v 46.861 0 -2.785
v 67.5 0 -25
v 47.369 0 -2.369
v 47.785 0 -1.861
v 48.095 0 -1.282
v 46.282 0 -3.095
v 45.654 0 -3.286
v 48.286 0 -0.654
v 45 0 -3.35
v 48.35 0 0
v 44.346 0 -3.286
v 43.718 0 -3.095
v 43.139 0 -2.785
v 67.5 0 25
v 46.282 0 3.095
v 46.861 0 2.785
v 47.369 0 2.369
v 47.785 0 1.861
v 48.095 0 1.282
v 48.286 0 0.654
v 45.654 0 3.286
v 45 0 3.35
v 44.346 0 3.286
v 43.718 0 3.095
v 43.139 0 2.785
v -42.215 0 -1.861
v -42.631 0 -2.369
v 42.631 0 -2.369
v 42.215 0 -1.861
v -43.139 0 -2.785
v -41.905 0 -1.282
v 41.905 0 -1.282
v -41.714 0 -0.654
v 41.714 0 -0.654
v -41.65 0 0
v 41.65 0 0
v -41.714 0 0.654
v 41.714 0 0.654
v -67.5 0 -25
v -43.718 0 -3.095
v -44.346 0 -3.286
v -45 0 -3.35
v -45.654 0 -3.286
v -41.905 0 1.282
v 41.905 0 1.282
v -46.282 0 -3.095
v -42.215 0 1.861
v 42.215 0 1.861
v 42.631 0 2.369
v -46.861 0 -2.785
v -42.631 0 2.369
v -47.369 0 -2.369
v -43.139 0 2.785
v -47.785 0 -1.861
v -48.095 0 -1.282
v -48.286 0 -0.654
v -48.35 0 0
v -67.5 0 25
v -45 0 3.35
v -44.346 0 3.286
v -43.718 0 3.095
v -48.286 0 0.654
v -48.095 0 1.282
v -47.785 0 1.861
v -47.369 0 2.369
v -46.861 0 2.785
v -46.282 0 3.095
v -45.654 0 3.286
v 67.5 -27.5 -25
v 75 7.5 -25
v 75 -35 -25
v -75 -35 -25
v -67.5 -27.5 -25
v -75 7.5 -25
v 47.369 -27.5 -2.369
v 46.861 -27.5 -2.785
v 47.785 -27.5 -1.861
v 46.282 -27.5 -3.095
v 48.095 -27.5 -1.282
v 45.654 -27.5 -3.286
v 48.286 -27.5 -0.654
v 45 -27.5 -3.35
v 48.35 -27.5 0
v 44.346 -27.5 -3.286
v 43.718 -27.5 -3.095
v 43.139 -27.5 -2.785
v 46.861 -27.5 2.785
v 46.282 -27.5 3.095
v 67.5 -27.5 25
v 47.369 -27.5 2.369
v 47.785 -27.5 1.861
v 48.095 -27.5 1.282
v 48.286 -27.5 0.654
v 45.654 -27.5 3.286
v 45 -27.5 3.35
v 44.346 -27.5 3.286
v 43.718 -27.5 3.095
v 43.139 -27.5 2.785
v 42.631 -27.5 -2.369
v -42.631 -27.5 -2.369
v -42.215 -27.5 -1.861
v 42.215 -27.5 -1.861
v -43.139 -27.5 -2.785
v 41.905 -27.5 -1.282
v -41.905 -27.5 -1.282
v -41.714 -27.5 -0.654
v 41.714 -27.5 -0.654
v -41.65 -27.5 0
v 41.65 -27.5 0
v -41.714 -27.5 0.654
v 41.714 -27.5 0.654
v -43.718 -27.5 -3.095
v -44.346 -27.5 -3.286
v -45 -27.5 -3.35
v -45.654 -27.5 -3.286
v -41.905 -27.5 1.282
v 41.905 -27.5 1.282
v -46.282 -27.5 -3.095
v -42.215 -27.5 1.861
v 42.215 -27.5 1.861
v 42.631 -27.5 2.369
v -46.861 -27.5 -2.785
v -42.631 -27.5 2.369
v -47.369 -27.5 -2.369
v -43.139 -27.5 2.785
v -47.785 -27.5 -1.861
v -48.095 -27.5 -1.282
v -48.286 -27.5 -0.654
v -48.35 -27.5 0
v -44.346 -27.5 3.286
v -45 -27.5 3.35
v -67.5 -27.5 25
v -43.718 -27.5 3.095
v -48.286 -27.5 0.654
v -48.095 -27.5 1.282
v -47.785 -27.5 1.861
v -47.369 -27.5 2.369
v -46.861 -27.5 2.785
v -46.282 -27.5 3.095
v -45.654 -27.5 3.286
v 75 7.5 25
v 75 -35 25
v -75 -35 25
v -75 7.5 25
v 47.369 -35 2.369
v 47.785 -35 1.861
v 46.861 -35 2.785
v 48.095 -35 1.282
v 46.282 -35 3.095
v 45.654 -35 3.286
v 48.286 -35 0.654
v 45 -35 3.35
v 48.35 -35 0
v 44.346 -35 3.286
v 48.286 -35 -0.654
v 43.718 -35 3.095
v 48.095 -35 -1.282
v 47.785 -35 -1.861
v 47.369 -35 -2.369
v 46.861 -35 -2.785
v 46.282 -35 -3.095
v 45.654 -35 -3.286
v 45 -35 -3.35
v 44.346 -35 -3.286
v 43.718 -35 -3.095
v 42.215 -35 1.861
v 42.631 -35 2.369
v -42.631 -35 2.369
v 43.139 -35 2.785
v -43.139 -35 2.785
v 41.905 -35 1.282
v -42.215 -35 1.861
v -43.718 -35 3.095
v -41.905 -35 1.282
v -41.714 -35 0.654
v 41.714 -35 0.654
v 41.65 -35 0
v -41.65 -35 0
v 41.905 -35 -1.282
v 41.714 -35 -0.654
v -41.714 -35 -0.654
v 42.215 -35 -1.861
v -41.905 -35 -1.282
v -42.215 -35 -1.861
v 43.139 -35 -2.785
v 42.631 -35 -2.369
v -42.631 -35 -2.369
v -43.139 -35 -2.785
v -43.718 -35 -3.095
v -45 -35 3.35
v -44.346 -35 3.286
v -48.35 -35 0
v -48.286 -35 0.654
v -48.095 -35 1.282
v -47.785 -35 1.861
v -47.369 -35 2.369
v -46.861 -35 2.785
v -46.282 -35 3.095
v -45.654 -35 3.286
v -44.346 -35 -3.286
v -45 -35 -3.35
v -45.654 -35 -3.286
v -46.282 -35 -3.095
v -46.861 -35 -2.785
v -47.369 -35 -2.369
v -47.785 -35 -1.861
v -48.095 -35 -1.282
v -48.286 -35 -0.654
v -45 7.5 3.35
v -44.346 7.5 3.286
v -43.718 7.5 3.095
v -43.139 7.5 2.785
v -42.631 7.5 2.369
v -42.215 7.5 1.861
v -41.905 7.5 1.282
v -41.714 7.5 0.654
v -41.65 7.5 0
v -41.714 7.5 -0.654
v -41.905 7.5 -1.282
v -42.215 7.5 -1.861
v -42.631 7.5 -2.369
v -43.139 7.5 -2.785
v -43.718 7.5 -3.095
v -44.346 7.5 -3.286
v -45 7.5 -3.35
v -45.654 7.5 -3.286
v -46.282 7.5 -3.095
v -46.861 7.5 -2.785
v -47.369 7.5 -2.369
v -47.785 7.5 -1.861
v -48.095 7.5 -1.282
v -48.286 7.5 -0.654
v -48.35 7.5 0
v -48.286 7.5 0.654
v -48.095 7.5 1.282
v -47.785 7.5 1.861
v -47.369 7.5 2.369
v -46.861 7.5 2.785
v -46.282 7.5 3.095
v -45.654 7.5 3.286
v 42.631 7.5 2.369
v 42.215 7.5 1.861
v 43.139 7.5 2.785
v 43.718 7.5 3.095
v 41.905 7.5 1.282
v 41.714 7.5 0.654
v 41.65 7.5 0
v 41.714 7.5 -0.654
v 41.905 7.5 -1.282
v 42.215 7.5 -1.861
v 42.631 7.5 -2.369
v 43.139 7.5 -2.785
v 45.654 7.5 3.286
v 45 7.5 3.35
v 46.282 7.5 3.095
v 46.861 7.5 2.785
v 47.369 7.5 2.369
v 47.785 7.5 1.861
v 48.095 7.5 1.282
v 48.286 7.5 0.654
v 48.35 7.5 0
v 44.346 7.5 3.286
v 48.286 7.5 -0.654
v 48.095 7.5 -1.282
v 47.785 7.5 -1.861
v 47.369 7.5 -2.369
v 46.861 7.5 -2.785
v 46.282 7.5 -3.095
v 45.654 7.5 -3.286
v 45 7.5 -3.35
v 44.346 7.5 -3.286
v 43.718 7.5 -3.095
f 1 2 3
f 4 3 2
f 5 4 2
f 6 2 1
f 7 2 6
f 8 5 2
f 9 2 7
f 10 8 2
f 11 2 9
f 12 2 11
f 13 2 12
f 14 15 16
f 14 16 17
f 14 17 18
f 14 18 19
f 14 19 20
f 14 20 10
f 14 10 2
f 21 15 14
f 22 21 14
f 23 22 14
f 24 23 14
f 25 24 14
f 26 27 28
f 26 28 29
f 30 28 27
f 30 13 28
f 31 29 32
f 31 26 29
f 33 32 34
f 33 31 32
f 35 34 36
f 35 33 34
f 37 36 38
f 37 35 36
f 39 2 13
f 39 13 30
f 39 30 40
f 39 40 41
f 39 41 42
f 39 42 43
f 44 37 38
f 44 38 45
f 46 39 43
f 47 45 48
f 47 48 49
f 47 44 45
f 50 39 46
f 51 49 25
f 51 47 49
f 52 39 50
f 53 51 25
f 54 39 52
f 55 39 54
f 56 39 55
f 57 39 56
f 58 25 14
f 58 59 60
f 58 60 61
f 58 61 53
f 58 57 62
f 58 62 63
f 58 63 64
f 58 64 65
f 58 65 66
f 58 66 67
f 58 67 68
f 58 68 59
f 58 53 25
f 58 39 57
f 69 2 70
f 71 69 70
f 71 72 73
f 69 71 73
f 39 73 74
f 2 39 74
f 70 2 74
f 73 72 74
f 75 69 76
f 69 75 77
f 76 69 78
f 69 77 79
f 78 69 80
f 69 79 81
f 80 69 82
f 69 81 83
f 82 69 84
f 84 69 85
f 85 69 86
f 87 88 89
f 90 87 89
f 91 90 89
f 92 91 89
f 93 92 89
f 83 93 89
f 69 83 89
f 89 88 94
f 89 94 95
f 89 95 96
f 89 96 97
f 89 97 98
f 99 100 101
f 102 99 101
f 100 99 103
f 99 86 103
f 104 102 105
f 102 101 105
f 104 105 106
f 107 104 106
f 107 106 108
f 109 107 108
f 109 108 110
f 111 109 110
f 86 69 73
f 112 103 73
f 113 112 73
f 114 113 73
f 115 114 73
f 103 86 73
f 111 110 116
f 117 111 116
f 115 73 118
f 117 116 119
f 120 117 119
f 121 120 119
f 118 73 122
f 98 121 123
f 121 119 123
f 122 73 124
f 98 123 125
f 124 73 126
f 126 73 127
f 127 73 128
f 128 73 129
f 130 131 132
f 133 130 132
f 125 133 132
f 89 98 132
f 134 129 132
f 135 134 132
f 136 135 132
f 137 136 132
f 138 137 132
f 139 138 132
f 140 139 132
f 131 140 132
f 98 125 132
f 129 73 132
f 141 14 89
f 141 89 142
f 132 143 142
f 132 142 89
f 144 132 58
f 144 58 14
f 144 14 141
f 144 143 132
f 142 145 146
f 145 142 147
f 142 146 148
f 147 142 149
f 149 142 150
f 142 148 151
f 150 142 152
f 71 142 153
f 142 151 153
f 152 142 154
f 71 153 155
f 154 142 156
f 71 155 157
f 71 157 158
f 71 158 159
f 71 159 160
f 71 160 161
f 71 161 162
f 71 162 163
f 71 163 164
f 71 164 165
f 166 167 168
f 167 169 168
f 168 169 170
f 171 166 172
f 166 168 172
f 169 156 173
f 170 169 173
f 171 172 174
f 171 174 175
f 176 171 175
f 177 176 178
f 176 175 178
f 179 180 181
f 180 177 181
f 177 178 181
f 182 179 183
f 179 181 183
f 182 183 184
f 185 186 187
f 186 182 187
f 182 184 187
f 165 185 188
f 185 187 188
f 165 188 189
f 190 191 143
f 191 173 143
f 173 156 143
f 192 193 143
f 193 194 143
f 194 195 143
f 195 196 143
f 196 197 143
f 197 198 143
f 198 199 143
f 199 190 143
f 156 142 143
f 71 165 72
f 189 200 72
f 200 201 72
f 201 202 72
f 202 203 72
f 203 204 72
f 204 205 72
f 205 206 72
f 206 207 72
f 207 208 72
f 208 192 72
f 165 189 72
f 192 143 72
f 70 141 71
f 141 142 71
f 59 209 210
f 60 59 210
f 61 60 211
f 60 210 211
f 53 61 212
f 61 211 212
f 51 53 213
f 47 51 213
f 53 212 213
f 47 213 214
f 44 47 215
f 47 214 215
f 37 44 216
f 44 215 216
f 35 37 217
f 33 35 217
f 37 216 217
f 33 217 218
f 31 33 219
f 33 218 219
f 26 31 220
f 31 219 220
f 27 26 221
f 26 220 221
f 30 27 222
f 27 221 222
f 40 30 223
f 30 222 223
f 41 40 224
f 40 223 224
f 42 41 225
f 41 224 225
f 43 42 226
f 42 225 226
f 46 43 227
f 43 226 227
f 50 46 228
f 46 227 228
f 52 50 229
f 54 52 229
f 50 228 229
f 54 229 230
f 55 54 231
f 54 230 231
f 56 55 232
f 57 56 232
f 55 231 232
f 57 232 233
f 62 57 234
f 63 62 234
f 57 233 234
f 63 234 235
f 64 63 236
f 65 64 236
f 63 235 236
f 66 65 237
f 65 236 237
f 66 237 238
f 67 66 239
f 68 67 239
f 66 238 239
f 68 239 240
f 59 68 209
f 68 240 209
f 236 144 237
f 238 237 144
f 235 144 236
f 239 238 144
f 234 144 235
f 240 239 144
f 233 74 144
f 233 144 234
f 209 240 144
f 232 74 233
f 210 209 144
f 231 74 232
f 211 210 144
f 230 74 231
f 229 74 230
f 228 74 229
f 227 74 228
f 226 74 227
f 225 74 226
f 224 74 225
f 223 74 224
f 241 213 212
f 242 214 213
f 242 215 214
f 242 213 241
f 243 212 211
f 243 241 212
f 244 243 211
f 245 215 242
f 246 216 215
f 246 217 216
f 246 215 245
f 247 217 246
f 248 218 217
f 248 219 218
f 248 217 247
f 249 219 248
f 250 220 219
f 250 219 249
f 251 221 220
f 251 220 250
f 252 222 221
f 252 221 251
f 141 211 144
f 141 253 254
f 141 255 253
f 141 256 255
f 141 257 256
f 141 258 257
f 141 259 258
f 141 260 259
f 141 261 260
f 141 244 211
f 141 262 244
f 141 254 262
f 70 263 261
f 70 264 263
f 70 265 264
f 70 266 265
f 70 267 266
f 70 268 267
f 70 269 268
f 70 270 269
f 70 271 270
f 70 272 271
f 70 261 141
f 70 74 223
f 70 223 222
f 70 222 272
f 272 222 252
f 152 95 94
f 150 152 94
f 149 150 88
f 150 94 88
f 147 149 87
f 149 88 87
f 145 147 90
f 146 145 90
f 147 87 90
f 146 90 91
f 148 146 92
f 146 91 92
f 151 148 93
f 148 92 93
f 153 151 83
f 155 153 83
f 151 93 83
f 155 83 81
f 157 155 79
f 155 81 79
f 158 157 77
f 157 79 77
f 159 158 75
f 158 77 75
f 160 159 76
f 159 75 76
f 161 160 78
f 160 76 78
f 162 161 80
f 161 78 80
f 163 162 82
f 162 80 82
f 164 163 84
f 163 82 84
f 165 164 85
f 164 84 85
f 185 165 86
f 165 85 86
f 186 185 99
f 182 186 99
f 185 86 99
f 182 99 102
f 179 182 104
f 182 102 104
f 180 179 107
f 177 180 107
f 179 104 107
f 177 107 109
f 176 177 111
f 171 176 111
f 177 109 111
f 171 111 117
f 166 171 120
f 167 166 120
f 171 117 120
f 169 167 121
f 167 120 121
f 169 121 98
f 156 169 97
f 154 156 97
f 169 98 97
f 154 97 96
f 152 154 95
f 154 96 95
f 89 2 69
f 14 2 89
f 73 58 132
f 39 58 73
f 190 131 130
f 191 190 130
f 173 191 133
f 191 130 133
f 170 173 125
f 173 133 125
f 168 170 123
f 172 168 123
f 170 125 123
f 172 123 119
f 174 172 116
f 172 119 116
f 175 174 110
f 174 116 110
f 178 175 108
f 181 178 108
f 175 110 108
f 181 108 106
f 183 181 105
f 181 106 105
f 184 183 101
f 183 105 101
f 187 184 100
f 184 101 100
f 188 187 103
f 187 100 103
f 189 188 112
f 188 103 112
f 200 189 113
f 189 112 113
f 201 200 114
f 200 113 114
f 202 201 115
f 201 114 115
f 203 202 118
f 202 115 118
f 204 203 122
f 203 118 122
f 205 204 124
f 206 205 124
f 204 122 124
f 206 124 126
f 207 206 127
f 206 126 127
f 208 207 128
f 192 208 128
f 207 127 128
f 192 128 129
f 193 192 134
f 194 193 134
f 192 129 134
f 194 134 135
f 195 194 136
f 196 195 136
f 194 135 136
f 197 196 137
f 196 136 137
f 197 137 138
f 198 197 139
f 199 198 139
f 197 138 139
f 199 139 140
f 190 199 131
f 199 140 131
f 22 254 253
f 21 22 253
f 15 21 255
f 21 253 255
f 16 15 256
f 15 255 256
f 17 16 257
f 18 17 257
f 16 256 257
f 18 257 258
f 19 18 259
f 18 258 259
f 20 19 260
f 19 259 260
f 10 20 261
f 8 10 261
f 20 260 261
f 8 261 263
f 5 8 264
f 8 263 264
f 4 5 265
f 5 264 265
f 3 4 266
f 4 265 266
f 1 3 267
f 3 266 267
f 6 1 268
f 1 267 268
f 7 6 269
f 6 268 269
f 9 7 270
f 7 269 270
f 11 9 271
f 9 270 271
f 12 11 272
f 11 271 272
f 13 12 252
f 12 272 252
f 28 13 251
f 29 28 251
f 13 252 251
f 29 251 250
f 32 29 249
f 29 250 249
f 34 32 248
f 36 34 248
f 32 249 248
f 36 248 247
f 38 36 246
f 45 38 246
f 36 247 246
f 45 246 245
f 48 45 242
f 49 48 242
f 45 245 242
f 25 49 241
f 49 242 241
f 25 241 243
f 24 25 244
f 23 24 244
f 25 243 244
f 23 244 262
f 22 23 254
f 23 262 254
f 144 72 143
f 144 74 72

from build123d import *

# Parameters (mm, degrees)
SKETCH1_W           = 150
SKETCH1_H           = 50
BOSS_EXTRUDE1_DEPTH = 7.5
SKETCH2_R           = 3.35
CUT_EXTRUDE1_DEPTH  = 7.5
SKETCH3_W           = 15
SKETCH3_H           = 50
BOSS_EXTRUDE2_DEPTH = 35
SKETCH6_W           = 50
SKETCH6_H           = 7.5
BOSS_EXTRUDE5_DEPTH = 120
SKETCH10_R          = 3.35
CUT_EXTRUDE4_DEPTH  = 7.5
SKETCH11_W          = 50
SKETCH11_H          = 27.5
CUT_EXTRUDE5_DEPTH  = 7.5
SKETCH12_W          = 50
SKETCH12_H          = 27.5
CUT_EXTRUDE6_DEPTH  = 7.5


with BuildPart() as part:
    # Sketch1 → Boss-Extrude1 (new body)
    with BuildSketch(Plane(origin=(0, 0, 0), x_dir=(1, 0, 0), z_dir=(0, 1, 0))):
        Rectangle(SKETCH1_W, SKETCH1_H)
    extrude(amount=BOSS_EXTRUDE1_DEPTH)

    # Sketch2 → Cut-Extrude1 (cut)
    with BuildSketch(Plane(origin=(0, 7.5, 0), x_dir=(1, 0, 0), z_dir=(0, 1, 0))):
        with Locations(Location((-45, 0, 0), (0, 0, 270))):
            Circle(SKETCH2_R)
        with Locations(Location((45, 0, 0), (0, 0, 270))):
            Circle(SKETCH2_R)
    extrude(amount=-CUT_EXTRUDE1_DEPTH, mode=Mode.SUBTRACT)

    # Sketch3 → Boss-Extrude2 (add)
    with BuildSketch(Plane.XZ):
        with Locations((-67.5, 0)):
            Rectangle(SKETCH3_W, SKETCH3_H)
        with Locations((67.5, 0)):
            Rectangle(SKETCH3_W, SKETCH3_H)
    extrude(amount=BOSS_EXTRUDE2_DEPTH)

    # Sketch6 → Boss-Extrude5 (add)
    with BuildSketch(Plane(origin=(-60, 0, 0), x_dir=(0, 0, -1), z_dir=(1, 0, 0))):
        with Locations((0, -31.25)):
            Rectangle(SKETCH6_W, SKETCH6_H)
    extrude(amount=BOSS_EXTRUDE5_DEPTH)

    # Sketch10 → Cut-Extrude4 (cut)
    with BuildSketch(Plane(origin=(0, -27.5, 0), x_dir=(1, 0, 0), z_dir=(0, 1, 0))):
        with Locations(Location((-45, 0, 0), (0, 0, 270))):
            Circle(SKETCH10_R)
        with Locations(Location((45, 0, 0), (0, 0, 270))):
            Circle(SKETCH10_R)
    extrude(amount=-CUT_EXTRUDE4_DEPTH, mode=Mode.SUBTRACT)

    # Sketch11 → Cut-Extrude5 (cut)
    with BuildSketch(Plane(origin=(-60, 0, 0), x_dir=(0, 0, -1), z_dir=(1, 0, 0))):
        with Locations((0, -13.75)):
            Rectangle(SKETCH11_W, SKETCH11_H)
    extrude(amount=-CUT_EXTRUDE5_DEPTH, mode=Mode.SUBTRACT)

    # Sketch12 → Cut-Extrude6 (cut)
    with BuildSketch(Plane.ZY.offset(-60)):
        with Locations((0, -13.75)):
            Rectangle(SKETCH12_W, SKETCH12_H)
    extrude(amount=-CUT_EXTRUDE6_DEPTH, mode=Mode.SUBTRACT)


solid = part.part
